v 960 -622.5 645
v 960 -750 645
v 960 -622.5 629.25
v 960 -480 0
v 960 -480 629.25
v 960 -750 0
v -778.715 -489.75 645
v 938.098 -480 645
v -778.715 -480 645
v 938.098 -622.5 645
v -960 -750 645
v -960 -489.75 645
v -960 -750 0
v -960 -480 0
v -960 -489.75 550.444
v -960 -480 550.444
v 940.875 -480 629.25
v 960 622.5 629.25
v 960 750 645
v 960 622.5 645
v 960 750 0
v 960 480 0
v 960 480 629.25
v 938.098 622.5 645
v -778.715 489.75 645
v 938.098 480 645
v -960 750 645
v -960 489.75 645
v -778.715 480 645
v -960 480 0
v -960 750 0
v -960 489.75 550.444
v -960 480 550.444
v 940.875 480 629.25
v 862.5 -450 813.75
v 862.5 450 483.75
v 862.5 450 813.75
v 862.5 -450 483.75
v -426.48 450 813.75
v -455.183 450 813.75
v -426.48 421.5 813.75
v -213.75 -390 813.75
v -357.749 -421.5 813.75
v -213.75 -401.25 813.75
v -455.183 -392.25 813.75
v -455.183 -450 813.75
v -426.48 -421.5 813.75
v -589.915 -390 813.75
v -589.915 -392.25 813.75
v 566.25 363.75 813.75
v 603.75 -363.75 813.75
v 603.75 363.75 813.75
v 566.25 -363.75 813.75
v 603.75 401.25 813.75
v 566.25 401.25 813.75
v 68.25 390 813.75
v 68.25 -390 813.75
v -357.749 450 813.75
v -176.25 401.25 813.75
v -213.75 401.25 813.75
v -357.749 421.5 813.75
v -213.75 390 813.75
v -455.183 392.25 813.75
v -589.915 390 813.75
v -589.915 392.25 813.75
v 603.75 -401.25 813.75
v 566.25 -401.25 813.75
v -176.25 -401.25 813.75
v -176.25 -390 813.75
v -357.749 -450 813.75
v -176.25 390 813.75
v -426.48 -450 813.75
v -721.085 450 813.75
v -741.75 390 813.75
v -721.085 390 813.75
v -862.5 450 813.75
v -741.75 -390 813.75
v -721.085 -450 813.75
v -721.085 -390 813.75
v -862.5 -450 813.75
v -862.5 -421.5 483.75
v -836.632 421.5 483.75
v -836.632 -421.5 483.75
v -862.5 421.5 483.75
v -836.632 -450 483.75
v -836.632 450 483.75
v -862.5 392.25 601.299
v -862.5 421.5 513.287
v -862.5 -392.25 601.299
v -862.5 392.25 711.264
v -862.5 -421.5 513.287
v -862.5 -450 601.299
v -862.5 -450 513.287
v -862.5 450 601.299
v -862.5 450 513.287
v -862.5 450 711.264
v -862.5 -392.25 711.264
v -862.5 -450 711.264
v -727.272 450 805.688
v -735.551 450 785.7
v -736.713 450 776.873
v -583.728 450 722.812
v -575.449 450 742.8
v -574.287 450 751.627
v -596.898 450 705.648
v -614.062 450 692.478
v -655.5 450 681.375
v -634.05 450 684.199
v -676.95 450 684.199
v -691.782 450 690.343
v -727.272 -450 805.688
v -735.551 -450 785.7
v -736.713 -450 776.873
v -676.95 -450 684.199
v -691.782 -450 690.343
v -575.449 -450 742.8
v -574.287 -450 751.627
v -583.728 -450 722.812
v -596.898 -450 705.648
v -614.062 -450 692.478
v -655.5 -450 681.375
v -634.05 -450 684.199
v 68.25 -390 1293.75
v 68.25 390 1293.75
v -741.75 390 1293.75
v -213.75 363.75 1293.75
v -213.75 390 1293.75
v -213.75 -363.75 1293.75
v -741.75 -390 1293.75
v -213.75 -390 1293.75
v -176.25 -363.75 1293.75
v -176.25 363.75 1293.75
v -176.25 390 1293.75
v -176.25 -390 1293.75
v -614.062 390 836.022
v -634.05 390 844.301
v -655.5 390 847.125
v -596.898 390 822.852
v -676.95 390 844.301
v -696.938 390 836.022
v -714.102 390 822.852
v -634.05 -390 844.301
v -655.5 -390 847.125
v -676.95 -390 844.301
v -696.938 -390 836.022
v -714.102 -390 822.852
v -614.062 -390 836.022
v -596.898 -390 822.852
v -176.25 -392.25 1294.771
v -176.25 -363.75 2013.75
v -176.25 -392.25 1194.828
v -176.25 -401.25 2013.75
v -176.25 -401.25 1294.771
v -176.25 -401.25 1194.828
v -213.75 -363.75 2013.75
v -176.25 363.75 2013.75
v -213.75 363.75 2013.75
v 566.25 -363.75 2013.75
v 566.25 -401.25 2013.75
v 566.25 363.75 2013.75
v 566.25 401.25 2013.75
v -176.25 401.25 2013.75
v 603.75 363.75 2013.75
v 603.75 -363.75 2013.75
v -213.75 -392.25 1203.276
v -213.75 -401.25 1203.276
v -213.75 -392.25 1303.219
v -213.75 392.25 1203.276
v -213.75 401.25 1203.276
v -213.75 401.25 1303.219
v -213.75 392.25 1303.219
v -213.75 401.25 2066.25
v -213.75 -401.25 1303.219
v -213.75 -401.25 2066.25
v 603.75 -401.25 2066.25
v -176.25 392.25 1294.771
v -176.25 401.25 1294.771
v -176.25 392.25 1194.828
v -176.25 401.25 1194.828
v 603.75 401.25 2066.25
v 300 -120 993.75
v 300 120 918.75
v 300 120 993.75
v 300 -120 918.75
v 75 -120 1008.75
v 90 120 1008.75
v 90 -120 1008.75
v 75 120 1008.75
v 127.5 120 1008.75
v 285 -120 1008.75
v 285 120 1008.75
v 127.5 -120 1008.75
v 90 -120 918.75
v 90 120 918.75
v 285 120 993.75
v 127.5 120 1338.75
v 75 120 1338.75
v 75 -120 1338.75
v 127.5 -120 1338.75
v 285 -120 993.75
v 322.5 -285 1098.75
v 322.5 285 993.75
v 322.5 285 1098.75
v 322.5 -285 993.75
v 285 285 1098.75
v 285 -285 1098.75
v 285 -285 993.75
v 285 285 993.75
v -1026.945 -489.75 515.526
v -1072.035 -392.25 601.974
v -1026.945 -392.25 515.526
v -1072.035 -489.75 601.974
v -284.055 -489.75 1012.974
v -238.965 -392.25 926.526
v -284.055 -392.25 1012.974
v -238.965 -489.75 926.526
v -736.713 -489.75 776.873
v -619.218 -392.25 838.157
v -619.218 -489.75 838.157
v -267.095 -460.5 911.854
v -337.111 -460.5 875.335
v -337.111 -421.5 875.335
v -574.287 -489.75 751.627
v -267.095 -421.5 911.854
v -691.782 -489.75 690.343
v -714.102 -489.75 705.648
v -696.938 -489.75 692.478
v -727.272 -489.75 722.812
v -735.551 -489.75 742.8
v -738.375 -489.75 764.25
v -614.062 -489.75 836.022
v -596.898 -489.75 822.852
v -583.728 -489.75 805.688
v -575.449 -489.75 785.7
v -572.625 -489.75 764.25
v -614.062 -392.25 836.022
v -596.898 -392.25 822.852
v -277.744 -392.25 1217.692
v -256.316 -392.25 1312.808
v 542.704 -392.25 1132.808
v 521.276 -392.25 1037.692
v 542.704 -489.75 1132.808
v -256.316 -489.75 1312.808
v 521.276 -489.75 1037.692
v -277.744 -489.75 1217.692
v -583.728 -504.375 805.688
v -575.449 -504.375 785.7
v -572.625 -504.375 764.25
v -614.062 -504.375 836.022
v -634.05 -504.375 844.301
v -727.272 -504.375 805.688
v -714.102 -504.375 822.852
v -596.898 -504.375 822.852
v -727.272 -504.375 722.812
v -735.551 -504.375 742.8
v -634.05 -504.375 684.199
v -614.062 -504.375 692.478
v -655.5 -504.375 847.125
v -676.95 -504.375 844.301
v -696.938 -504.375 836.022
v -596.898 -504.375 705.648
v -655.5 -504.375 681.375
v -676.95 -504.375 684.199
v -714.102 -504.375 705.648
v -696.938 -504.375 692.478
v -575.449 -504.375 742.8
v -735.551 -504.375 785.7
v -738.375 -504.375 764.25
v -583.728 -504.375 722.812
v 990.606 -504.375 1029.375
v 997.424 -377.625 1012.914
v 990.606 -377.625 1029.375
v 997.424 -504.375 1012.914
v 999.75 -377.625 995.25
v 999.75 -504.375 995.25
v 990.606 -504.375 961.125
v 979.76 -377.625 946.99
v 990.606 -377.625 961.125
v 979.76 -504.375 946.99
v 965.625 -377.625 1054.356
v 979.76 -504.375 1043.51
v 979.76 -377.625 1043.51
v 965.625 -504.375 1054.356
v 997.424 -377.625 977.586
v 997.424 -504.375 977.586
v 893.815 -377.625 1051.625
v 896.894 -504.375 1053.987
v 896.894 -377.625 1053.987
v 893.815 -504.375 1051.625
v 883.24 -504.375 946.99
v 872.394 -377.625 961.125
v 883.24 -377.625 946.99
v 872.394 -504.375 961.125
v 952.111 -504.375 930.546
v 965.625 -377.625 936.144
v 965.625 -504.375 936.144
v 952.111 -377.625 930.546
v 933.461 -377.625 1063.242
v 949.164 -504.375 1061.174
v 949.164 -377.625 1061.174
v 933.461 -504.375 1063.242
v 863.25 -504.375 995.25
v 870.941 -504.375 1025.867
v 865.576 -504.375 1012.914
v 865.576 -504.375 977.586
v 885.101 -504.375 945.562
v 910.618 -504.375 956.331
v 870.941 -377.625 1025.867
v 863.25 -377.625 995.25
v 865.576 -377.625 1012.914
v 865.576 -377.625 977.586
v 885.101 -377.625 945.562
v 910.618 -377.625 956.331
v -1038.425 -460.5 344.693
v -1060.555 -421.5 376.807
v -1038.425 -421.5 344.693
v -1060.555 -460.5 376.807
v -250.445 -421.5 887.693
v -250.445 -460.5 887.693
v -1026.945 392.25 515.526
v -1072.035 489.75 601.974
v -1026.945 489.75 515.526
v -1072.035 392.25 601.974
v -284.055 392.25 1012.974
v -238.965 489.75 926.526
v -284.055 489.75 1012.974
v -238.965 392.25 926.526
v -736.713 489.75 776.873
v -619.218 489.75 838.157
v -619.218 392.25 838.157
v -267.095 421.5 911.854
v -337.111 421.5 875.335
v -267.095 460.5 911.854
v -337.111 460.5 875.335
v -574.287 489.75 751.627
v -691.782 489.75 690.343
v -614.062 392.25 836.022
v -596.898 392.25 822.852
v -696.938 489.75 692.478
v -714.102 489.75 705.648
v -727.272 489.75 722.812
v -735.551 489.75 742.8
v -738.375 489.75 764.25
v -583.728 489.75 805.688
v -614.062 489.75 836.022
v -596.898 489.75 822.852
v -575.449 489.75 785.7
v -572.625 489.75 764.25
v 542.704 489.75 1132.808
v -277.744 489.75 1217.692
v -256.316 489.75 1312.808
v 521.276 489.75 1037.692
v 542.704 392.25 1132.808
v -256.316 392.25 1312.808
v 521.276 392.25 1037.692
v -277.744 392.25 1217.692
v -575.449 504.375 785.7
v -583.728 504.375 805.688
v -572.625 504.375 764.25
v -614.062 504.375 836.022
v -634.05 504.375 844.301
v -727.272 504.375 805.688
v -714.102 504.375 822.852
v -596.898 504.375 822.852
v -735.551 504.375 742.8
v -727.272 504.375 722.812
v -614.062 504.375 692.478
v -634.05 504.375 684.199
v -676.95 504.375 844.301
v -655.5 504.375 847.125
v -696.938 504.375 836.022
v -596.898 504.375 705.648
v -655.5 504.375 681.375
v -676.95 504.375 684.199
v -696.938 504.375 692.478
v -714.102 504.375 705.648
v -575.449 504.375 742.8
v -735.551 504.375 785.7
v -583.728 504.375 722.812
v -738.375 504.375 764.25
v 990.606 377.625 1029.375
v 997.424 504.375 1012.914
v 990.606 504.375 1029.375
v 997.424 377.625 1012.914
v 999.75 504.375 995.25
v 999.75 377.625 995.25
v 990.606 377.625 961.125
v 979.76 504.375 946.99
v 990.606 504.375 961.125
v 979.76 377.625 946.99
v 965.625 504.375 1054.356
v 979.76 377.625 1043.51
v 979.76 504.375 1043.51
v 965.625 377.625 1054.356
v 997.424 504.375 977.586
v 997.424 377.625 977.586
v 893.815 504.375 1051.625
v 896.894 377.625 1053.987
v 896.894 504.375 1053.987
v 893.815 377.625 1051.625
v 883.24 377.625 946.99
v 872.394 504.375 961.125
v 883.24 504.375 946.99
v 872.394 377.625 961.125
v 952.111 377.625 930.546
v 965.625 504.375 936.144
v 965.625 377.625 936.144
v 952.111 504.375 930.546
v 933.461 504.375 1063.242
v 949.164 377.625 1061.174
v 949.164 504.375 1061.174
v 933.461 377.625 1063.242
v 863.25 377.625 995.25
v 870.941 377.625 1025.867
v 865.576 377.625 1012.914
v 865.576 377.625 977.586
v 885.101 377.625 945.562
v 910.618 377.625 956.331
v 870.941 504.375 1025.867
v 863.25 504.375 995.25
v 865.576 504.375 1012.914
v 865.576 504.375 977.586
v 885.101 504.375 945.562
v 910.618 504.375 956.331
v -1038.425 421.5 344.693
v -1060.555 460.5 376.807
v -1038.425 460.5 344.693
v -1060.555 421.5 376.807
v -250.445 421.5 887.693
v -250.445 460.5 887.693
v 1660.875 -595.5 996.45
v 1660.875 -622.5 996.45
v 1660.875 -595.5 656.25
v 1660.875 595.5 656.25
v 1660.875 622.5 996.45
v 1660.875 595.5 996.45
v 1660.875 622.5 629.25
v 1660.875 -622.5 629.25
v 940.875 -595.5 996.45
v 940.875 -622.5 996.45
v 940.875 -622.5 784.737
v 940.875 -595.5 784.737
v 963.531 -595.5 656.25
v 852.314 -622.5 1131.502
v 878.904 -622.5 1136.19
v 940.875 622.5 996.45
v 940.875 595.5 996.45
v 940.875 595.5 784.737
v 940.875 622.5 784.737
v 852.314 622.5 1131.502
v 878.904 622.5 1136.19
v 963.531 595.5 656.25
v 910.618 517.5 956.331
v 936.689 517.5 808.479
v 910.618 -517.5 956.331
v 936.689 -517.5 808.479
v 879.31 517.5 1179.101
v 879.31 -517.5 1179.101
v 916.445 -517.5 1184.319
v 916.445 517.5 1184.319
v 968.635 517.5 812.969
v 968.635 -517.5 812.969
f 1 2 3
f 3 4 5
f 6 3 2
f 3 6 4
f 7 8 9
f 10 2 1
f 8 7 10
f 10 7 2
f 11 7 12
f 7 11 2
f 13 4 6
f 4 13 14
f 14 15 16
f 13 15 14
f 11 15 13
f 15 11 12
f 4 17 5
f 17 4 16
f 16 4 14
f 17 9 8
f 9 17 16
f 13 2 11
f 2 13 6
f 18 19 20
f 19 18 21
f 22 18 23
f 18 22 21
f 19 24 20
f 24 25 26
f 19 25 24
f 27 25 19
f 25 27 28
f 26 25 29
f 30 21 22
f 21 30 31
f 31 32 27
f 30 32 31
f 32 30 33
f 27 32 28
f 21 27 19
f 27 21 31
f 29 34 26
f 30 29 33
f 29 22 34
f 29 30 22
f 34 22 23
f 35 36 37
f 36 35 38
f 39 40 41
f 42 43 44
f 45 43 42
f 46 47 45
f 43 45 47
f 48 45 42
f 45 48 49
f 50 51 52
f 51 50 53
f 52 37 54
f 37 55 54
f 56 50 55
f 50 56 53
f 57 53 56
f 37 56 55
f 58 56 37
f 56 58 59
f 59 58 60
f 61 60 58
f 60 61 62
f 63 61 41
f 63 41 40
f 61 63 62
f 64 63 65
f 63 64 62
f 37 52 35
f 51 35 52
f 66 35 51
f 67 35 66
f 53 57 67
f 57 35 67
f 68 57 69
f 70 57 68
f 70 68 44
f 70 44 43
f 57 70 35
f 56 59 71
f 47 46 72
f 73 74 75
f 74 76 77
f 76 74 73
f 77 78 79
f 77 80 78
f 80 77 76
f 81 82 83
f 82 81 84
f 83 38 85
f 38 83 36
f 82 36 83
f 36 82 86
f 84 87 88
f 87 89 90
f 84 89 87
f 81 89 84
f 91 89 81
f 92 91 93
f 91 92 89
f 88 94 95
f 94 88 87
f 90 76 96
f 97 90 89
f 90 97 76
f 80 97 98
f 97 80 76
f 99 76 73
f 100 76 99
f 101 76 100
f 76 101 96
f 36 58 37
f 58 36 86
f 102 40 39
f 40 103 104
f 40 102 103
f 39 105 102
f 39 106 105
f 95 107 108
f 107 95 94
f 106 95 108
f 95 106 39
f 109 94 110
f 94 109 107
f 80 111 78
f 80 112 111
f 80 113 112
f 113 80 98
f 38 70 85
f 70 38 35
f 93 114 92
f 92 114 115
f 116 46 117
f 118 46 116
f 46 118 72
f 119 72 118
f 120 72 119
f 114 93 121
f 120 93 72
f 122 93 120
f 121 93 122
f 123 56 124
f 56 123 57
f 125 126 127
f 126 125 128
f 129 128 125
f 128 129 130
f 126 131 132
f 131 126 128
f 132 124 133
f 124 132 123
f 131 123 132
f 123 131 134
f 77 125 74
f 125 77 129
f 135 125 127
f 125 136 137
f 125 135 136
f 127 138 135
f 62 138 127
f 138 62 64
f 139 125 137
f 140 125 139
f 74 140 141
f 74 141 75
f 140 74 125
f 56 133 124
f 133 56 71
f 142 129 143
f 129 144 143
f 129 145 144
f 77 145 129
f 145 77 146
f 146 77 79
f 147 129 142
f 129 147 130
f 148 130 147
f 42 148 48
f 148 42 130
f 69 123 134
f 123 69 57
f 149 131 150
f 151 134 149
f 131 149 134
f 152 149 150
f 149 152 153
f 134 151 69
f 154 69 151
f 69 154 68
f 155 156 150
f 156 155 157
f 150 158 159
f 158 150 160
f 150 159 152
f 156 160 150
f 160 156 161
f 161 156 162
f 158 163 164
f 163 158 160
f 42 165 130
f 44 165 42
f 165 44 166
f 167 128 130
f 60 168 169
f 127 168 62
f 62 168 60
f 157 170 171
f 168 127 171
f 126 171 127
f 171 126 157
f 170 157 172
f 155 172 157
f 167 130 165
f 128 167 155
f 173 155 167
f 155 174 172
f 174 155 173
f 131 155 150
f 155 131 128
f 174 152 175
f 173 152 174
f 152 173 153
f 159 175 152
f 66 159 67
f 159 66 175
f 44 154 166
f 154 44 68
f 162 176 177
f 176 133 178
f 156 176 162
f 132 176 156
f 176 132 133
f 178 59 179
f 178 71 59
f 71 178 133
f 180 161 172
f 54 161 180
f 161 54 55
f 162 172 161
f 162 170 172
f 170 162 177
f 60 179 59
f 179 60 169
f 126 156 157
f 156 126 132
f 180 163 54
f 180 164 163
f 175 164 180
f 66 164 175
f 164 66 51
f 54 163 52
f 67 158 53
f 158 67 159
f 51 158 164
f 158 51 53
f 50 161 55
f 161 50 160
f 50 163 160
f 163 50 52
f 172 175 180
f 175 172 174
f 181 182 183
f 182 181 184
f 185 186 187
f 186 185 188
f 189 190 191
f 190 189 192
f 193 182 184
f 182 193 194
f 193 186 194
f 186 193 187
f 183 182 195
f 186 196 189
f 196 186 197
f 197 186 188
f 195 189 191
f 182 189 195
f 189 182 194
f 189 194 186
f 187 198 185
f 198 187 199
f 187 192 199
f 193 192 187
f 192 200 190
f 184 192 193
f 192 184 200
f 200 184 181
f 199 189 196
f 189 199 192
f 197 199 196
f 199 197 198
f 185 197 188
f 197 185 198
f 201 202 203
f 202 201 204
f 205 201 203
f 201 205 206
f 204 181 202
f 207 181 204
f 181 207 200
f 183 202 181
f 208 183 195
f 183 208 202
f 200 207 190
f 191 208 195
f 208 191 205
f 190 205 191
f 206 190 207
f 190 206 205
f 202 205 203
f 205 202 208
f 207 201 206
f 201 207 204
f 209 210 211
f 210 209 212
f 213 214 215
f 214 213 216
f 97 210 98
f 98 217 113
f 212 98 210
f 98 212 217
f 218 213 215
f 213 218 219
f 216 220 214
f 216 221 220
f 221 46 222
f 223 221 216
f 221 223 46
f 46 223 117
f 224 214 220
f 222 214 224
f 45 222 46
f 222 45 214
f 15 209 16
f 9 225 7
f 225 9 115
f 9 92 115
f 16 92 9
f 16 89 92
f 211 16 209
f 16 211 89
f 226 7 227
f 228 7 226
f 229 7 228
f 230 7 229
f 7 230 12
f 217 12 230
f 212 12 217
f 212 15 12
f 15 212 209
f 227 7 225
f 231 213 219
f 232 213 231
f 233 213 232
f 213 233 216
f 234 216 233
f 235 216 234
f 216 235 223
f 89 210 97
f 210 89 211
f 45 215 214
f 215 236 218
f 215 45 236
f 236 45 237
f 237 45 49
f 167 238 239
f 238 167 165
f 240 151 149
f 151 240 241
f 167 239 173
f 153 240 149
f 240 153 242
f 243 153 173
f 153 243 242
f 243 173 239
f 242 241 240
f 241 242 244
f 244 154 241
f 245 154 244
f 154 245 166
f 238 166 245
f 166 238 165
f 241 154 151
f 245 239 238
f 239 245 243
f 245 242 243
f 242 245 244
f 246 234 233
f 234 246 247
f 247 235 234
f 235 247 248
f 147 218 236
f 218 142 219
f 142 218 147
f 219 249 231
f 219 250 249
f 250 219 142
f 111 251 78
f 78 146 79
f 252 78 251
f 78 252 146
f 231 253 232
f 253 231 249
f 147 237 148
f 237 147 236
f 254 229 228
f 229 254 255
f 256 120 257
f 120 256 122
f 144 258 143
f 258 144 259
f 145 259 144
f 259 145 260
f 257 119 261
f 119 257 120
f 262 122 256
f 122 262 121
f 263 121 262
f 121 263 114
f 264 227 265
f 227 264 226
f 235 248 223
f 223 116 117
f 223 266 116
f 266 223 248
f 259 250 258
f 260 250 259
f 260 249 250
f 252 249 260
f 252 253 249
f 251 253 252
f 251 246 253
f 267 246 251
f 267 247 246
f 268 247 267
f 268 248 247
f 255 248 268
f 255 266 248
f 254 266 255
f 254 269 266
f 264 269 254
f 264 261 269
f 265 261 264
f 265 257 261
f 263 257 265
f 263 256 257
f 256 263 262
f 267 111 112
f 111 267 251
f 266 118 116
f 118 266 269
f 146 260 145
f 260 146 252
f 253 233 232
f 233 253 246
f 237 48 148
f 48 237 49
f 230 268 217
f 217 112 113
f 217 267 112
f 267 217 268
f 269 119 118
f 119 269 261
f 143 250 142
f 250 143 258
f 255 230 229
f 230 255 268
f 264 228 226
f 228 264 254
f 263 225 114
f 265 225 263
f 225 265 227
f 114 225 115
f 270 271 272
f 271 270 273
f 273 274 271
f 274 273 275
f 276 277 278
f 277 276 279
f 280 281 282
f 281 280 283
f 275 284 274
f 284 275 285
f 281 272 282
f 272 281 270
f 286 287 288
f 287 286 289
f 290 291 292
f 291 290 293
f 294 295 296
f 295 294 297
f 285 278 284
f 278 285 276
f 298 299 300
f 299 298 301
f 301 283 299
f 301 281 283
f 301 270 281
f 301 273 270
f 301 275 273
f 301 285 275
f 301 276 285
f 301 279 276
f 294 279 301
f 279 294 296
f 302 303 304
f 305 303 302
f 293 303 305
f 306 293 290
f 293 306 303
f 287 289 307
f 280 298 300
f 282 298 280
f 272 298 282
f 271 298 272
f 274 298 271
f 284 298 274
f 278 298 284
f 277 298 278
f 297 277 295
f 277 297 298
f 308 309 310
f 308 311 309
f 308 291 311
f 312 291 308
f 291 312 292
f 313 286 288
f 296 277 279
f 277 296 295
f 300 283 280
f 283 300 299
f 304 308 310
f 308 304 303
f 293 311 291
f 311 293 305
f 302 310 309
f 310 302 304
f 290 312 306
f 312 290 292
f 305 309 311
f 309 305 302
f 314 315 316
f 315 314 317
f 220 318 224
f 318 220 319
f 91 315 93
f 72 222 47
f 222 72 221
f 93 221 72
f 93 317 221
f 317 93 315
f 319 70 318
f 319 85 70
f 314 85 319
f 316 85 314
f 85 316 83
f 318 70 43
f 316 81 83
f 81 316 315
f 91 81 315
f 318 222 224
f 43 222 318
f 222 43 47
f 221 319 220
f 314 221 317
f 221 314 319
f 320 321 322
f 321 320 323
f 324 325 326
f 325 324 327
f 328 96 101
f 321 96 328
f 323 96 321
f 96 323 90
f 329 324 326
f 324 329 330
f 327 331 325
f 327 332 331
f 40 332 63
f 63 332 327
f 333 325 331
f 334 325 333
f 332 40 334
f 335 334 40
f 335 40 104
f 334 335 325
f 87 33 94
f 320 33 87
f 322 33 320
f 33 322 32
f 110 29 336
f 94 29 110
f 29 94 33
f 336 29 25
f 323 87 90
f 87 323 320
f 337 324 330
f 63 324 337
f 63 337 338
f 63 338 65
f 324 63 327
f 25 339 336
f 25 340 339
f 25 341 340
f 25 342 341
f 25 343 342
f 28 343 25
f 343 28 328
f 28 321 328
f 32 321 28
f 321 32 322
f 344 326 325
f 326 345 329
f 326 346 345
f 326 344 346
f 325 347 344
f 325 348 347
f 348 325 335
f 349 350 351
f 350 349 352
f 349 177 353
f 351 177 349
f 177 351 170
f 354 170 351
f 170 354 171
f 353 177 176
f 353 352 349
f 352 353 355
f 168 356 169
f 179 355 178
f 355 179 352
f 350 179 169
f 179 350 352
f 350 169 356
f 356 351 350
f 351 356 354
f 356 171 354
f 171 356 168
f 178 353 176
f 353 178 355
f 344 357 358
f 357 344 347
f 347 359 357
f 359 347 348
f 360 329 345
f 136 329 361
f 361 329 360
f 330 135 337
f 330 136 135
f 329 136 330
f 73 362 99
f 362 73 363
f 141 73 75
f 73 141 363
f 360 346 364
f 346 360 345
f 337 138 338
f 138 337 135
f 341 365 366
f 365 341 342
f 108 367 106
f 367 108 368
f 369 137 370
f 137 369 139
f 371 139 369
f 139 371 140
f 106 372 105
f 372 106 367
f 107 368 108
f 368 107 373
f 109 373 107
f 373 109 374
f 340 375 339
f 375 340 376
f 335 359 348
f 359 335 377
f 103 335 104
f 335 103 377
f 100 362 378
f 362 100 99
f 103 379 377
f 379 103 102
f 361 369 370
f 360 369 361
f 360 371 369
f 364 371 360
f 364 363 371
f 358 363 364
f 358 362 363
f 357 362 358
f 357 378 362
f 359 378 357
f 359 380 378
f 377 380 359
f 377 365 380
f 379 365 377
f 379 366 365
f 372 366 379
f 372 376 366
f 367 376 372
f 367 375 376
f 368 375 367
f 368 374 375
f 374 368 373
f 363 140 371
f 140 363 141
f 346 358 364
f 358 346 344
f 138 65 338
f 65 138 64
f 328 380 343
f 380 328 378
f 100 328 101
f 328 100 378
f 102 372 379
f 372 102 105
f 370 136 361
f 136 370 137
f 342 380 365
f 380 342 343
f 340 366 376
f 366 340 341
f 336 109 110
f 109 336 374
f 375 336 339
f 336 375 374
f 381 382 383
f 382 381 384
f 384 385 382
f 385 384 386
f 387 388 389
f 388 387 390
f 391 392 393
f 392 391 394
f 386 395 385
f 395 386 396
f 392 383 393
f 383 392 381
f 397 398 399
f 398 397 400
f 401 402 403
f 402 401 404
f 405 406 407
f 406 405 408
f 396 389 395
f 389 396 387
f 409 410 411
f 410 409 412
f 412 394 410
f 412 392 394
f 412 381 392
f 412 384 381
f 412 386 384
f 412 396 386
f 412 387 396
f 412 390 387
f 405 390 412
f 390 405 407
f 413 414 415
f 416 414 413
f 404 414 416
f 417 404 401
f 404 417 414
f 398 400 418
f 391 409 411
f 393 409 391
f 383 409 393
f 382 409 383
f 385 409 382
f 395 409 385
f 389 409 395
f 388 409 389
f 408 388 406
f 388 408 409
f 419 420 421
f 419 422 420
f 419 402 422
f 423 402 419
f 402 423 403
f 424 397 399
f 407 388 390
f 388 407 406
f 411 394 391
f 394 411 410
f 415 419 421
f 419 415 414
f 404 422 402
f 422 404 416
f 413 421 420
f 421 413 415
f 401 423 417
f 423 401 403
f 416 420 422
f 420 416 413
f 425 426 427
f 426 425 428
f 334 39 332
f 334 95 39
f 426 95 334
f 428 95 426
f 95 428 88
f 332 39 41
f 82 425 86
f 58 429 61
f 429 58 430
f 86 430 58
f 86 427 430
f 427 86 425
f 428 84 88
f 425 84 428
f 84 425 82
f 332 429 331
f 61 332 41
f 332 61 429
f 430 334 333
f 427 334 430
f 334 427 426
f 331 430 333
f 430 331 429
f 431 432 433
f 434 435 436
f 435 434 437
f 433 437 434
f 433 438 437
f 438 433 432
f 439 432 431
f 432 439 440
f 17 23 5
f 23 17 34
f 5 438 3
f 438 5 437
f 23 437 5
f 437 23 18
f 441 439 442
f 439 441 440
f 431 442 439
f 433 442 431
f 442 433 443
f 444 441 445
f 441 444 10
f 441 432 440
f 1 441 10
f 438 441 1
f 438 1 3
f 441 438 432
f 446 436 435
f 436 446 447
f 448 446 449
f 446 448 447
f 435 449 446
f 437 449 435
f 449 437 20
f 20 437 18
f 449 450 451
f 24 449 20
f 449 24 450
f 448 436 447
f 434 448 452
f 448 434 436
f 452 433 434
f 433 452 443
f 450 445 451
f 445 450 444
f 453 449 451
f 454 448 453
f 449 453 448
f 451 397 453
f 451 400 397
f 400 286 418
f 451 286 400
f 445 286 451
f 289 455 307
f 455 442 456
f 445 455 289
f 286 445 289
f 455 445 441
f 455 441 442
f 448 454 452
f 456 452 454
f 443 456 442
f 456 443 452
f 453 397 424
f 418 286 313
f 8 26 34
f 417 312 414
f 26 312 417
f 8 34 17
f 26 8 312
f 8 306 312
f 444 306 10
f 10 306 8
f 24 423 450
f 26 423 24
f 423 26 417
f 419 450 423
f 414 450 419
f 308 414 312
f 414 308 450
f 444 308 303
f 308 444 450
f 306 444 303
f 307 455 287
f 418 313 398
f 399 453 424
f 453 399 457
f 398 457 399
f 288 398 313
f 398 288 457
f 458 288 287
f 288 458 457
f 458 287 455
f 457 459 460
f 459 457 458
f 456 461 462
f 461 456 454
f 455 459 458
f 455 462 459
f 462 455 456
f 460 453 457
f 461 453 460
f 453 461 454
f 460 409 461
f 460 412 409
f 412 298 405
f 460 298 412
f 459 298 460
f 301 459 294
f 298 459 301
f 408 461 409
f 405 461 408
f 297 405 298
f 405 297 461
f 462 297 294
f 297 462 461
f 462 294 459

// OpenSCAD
// file: parameters.scad
// SPDX-License-Identifier: CERN-OHL-S-2.0
// OCE-CTL-01 concept visualization parameters; NOT fabrication dimensions.
// Units: mm. All proportions except machine_width target are display assumptions.

machine_width = 1500; // Initial AI-authored target, owner review pending: approximately 1.5 m overall width.

// Display-only proportions. These are NOT engineered sizes or clearances.
track_length = machine_width * 1.28;
track_width = machine_width * 0.18;
track_height = machine_width * 0.43;
wheel_diameter = track_height * 0.66;
wheel_width = track_width * 0.82;
frame_length = machine_width * 1.15;
frame_width = machine_width * 0.60;
frame_height = machine_width * 0.22;
frame_bottom = track_height * 0.75;
operator_zone_length = machine_width * 0.52;
operator_zone_width = machine_width * 0.51;
operator_zone_height = machine_width * 0.80;
operator_zone_base = frame_bottom + frame_height;
post_width = machine_width * 0.025; // Visual marker; absolutely not a ROPS member size.
roof_height = machine_width * 0.035; // Visual envelope only; not protective structure.
arm_width = machine_width * 0.065;
arm_rear = [-frame_length * 0.38, 0, frame_bottom + frame_height * 0.85];
arm_front = [frame_length * 0.54, 0, frame_bottom + frame_height * 1.55];
quick_attach_width = machine_width * 0.69;
quick_attach_height = machine_width * 0.25;
quick_attach_thickness = machine_width * 0.025;
bucket_width = machine_width * 0.83;
bucket_depth = machine_width * 0.48;
bucket_height = machine_width * 0.34;
bucket_wall = machine_width * 0.018; // Plate display thickness only; not released.
battery_length = machine_width * 0.54;
battery_width = machine_width * 0.52;
battery_height = machine_width * 0.32;
visual_detail = 24; // Mesh smoothness only; no engineering significance.
// main file
// SPDX-License-Identifier: CERN-OHL-S-2.0
// OCE-CTL-01 CONCEPT ENVELOPE ONLY.
// NOT fabrication CAD, NOT structurally validated, NOT a ROPS/FOPS design,
// NOT a compatible quick-attach drawing, and NOT a performance model.

include <parameters.scad>

$fn = visual_detail;

module beam_between(p1, p2, width) {
    dx = p2[0] - p1[0];
    dy = p2[1] - p1[1];
    dz = p2[2] - p1[2];
    horizontal = sqrt(dx * dx + dy * dy);
    length = sqrt(horizontal * horizontal + dz * dz);
    translate(p1)
        rotate([0, -atan2(dz, horizontal), atan2(dy, dx)])
            cube([length, width, width], center = true);
}

module track_module(side = 1) {
    y = side * (machine_width - track_width) / 2;
    color("DimGray") {
        translate([-track_length / 2, y - track_width / 2, 0])
            cube([track_length, track_width, track_height]);
        // Visible wheel/end forms embedded in the simplified track envelope.
        for (x = [-track_length * 0.34, 0, track_length * 0.34]) {
            translate([x, y, track_height * 0.48])
                rotate([90, 0, 0])
                    cylinder(d = wheel_diameter, h = wheel_width, center = true);
        }
    }
    color("DarkSlateGray")
        translate([-track_length * 0.30, y, track_height * 0.70])
            rotate([90, 0, 0])
                cylinder(d = wheel_diameter * 0.36, h = wheel_width * 1.05, center = true);
}

module chassis_frame() {
    color("Silver")
        translate([-frame_length / 2, -frame_width / 2, frame_bottom])
            cube([frame_length, frame_width, frame_height]);
    color("RoyalBlue")
        translate([-frame_length * 0.43, -battery_width / 2, frame_bottom + frame_height])
            cube([battery_length, battery_width, battery_height]);
    // No battery enclosure construction, protection, or mounting is designed here.
}

module operator_zone() {
    base_z = operator_zone_base;
    top_z = base_z + operator_zone_height;
    x0 = -operator_zone_length * 0.25;
    x1 = x0 + operator_zone_length;
    y0 = -operator_zone_width / 2;
    y1 = operator_zone_width / 2;
    // UNRATED operator-zone visual posts. Not released ROPS/FOPS geometry.
    color("Gold") {
        for (x = [x0, x1], y = [y0, y1]) {
            translate([x - post_width / 2, y - post_width / 2, base_z])
                cube([post_width, post_width, operator_zone_height]);
        }
        translate([x0 - post_width / 2, y0 - post_width / 2, top_z])
            cube([operator_zone_length + post_width, operator_zone_width + post_width, roof_height]);
    }
    color("Black") {
        seat_x = (x0 + x1) / 2;
        translate([seat_x - machine_width * 0.07, -machine_width * 0.08, base_z + machine_width * 0.07])
            cube([machine_width * 0.14, machine_width * 0.16, machine_width * 0.06]);
        translate([seat_x - machine_width * 0.08, -machine_width * 0.08, base_z + machine_width * 0.13])
            cube([machine_width * 0.035, machine_width * 0.16, machine_width * 0.22]);
        translate([seat_x + machine_width * 0.06, -machine_width * 0.19, base_z + machine_width * 0.12])
            cube([machine_width * 0.025, machine_width * 0.38, machine_width * 0.07]);
    }
}

module lift_arm(side = 1) {
    offset_y = side * frame_width * 0.49;
    rear = [arm_rear[0], offset_y, arm_rear[2]];
    elbow = [(arm_rear[0] + arm_front[0]) * 0.48, offset_y, arm_front[2] + machine_width * 0.12];
    front = [arm_front[0], offset_y, arm_front[2]];
    color("DarkOrange") {
        beam_between(rear, elbow, arm_width);
        beam_between(elbow, front, arm_width);
        translate(rear)
            rotate([90, 0, 0])
                cylinder(d = arm_width * 1.7, h = arm_width * 1.3, center = true);
        translate(front)
            rotate([90, 0, 0])
                cylinder(d = arm_width * 1.4, h = arm_width * 1.3, center = true);
    }
    // Silver actuator is a visual mechanism hint, not a sized hydraulic cylinder.
    color("LightGray")
        beam_between([rear[0], offset_y, frame_bottom + frame_height * 0.45], elbow, arm_width * 0.40);
}

module quick_attach() {
    // Universal-STYLE visual marker only; mating geometry and retention are TBD.
    color("FireBrick")
        translate([arm_front[0], -quick_attach_width / 2, arm_front[2] - quick_attach_height * 0.50])
            rotate([0, -8, 0])
                cube([quick_attach_thickness, quick_attach_width, quick_attach_height]);
}

module bucket() {
    x = arm_front[0] + quick_attach_thickness * 0.25;
    y = -bucket_width / 2;
    z = arm_front[2] - quick_attach_height * 0.50 - bucket_height * 0.35;
    color("Sienna") {
        // Open-top scoop assembled from display solids; no weldment or wear geometry.
        translate([x, y, z])
            cube([bucket_depth, bucket_width, bucket_wall]);
        translate([x, y, z])
            rotate([0, -10, 0])
                cube([bucket_wall, bucket_width, bucket_height]);
        translate([x + bucket_depth * 0.88, y, z])
            cube([bucket_depth * 0.12, bucket_width, bucket_wall * 0.65]);
        for (side_y = [y, y + bucket_width - bucket_wall]) {
            translate([x, side_y, z])
                cube([bucket_depth, bucket_wall, bucket_height * 0.72]);
        }
    }
}

module oce_ctl01_concept() {
    track_module(-1);
    track_module(1);
    chassis_frame();
    operator_zone();
    lift_arm(-1);
    lift_arm(1);
    quick_attach();
    bucket();
}

oce_ctl01_concept();
